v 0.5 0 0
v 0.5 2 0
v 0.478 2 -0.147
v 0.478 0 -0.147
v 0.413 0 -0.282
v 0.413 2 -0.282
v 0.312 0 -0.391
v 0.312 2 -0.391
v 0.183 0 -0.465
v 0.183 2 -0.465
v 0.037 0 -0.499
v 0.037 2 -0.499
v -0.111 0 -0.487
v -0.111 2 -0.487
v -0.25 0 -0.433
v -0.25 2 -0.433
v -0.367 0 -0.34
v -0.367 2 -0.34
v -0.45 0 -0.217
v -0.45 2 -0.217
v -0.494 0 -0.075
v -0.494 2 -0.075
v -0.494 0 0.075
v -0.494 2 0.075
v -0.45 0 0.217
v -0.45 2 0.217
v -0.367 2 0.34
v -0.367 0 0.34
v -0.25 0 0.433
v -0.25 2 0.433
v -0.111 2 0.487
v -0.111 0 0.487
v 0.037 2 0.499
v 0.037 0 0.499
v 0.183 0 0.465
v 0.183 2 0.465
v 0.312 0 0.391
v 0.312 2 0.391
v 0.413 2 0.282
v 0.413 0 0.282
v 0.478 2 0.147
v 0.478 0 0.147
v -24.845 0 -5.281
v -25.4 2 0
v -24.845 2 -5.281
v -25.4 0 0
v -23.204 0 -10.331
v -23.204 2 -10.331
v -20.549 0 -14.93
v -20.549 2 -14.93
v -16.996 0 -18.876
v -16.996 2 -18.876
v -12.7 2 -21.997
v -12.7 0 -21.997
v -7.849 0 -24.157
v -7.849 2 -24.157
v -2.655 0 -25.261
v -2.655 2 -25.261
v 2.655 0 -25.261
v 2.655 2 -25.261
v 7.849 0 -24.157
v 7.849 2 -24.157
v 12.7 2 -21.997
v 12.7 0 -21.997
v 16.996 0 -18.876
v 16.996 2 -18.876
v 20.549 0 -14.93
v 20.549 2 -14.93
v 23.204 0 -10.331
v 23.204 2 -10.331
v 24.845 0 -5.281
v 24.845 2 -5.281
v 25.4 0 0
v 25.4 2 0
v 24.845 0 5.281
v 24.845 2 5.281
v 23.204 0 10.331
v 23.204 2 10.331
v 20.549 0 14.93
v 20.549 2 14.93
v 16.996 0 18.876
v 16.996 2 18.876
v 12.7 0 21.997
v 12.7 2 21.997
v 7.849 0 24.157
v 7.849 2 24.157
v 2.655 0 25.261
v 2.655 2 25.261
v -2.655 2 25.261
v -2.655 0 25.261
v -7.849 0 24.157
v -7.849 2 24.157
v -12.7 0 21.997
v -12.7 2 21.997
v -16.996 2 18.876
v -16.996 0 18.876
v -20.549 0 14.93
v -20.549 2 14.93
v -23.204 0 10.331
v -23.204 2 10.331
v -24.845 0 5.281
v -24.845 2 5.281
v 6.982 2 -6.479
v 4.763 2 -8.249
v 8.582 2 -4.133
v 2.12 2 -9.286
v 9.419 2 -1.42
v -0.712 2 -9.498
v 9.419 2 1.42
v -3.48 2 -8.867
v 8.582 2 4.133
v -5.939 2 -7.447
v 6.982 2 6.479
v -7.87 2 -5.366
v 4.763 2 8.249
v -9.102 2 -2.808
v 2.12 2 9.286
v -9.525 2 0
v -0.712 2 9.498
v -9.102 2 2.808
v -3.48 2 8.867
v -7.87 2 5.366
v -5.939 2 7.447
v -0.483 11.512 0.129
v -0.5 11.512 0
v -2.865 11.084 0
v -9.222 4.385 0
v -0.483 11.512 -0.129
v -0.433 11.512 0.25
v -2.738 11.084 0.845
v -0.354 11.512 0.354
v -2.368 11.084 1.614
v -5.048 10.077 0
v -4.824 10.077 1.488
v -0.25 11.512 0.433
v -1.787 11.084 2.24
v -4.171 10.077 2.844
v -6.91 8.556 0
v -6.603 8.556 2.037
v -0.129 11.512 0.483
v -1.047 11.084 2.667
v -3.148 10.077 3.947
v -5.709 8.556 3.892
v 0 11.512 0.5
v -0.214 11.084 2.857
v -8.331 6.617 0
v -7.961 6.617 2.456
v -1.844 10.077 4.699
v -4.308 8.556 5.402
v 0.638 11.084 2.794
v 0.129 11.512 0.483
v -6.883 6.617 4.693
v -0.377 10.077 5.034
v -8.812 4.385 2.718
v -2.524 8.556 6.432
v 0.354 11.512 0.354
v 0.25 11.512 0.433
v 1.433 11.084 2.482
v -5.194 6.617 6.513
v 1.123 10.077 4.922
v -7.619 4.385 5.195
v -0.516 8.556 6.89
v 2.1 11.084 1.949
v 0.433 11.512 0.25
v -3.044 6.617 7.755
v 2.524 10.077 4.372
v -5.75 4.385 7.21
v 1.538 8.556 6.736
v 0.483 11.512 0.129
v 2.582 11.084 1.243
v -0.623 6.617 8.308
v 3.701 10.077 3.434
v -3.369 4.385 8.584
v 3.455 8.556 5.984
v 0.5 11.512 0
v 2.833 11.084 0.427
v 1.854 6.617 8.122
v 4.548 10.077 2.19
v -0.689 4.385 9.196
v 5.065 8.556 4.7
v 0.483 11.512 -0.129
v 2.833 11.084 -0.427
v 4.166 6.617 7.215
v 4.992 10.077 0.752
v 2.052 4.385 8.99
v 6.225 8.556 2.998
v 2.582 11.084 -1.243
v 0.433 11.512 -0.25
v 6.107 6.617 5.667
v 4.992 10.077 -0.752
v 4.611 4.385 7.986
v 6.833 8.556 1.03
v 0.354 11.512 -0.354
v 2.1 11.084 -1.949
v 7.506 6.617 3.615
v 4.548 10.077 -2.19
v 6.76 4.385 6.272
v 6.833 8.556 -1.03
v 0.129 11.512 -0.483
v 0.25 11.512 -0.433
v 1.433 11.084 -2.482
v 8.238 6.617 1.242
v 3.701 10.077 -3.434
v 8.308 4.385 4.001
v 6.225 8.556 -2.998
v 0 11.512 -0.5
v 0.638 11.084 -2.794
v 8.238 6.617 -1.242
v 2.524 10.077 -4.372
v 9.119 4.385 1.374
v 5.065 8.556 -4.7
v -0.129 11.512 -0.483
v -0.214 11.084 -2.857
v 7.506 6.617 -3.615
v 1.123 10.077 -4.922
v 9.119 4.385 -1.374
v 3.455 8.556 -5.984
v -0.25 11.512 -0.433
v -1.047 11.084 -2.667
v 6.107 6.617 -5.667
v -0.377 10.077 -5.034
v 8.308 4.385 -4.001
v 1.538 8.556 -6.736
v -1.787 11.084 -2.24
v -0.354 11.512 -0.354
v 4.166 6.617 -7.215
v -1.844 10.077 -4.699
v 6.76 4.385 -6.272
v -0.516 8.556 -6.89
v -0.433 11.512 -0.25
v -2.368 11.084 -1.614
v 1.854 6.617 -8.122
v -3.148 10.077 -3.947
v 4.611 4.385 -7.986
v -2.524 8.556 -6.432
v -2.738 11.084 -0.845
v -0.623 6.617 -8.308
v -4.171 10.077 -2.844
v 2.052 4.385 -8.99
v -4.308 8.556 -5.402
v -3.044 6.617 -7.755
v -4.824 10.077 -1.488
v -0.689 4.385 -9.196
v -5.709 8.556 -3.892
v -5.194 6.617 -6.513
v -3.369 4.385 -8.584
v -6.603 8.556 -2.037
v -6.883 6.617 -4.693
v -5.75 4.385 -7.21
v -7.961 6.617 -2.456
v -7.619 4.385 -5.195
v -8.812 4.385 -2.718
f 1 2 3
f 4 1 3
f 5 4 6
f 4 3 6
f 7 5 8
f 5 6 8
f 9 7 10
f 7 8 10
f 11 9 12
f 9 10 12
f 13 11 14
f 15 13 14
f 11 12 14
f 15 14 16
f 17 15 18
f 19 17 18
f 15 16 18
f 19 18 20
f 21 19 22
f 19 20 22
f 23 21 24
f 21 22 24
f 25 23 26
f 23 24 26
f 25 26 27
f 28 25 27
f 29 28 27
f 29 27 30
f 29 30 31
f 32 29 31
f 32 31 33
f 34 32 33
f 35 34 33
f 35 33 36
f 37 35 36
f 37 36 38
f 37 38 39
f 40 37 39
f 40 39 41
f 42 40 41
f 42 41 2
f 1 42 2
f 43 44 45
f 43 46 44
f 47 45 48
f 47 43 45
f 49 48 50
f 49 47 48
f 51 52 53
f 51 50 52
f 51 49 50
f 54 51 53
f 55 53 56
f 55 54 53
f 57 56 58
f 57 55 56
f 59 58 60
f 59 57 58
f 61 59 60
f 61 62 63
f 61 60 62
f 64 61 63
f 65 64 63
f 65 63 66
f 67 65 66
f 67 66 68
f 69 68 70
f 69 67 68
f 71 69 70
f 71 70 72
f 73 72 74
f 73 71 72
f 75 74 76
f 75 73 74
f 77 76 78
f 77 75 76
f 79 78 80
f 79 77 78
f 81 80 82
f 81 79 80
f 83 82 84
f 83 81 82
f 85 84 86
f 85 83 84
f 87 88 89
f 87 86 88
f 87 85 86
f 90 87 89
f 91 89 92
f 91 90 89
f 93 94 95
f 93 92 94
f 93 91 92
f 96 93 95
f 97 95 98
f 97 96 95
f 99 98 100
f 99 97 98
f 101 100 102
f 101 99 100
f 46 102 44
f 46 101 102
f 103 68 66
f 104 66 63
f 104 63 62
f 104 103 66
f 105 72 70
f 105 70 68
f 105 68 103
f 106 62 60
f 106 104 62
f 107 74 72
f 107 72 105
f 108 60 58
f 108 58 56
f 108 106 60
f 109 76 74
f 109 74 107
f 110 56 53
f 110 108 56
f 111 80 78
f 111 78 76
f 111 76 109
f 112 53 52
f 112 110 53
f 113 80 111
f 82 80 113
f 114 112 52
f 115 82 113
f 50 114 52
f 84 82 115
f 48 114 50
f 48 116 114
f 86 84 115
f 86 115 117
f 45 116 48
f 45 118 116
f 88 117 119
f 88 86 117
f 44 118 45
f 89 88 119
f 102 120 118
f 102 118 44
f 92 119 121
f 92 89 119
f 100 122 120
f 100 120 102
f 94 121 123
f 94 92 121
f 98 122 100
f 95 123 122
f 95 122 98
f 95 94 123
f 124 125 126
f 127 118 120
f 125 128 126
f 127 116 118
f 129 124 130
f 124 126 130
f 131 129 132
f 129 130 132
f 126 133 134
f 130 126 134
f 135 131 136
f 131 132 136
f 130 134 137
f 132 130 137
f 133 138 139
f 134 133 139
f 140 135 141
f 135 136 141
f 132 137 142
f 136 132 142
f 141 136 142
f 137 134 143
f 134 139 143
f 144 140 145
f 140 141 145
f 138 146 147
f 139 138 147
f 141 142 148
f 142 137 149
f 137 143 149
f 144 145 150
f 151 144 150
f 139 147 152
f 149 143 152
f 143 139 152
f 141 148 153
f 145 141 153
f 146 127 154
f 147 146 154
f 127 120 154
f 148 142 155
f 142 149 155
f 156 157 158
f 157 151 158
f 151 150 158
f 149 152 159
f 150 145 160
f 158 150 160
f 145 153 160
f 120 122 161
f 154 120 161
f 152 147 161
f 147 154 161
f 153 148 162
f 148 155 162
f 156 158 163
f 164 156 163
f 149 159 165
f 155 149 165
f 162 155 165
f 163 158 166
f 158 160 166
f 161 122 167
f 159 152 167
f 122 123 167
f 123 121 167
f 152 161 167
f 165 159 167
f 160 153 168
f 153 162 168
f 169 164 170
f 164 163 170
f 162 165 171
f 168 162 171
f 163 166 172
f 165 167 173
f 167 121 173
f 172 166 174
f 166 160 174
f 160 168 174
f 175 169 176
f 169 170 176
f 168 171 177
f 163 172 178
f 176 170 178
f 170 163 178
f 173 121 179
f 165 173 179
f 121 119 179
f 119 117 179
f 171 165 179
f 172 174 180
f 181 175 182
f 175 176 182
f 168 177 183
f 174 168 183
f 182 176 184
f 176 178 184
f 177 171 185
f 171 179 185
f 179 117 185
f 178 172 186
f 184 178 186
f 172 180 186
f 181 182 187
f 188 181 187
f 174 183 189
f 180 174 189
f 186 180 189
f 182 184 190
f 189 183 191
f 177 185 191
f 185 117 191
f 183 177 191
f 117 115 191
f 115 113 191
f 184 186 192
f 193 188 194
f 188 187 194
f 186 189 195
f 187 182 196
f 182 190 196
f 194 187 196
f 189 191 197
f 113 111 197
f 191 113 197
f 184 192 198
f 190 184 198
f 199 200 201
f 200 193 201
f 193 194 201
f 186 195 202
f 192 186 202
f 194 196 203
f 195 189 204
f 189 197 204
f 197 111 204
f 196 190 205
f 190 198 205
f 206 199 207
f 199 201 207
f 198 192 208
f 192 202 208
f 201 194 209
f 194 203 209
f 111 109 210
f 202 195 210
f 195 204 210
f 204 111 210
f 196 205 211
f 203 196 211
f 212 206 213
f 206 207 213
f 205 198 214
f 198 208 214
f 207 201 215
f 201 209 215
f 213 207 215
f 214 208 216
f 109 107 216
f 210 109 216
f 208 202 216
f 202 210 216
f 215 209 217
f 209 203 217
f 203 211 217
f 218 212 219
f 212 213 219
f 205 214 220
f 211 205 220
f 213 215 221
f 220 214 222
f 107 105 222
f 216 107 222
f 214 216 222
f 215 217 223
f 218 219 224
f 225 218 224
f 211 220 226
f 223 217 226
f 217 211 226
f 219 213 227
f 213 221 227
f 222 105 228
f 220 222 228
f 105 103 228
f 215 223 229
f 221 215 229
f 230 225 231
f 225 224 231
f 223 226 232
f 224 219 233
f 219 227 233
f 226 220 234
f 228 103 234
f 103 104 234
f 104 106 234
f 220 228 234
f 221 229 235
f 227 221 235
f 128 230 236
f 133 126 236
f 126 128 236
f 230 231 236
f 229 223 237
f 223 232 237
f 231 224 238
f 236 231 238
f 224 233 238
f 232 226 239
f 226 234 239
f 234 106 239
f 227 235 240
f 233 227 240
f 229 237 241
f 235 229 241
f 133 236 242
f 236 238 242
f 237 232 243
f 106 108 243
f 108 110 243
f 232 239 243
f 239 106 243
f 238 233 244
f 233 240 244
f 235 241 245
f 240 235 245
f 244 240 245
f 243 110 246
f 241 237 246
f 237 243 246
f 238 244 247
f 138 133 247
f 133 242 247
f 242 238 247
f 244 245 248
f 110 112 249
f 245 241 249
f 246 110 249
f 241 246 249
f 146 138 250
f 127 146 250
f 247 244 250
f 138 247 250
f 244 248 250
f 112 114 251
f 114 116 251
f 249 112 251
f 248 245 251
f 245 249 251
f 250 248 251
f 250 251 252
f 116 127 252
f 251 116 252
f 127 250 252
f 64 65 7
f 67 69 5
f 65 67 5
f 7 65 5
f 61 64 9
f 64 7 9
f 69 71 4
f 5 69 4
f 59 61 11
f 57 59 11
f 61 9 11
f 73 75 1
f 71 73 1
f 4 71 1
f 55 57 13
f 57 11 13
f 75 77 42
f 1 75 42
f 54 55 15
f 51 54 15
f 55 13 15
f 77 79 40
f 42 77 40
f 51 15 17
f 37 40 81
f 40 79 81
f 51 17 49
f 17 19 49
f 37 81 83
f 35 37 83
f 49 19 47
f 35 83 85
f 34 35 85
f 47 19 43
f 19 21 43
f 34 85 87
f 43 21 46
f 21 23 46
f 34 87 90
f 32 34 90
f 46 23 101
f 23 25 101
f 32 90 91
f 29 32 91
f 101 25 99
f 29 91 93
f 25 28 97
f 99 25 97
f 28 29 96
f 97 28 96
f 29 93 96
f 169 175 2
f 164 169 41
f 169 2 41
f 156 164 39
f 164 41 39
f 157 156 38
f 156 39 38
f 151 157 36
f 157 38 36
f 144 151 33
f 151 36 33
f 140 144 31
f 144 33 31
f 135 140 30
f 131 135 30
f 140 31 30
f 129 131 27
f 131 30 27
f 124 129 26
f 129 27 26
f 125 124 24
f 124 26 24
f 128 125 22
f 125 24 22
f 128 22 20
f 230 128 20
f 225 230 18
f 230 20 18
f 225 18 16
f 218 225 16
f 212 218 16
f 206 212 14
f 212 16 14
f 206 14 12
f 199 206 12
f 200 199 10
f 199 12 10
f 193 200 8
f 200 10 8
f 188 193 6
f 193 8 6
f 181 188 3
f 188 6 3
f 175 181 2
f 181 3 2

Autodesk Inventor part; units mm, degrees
ref_plane "YZ Plane" through (0, 0, 0) normal (1, 0, 0) x (0, 1, 0)
ref_plane "XZ Plane" through (0, 0, 0) normal (0, 1, 0) x (-1, 0, 0)
ref_plane "XY Plane" through (0, 0, 0) normal (0, 0, 1) x (1, 0, 0)
sketch "Sketch1" plane through (0, 0, 0) normal (0, 1, 0) x (-1, 0, 0)
  circle A0 centre (0, 0) radius 25.4
  dimension "d0" = 50.8
extrude "Extrusion1" add sketch "Sketch1" along normal blind 2
sketch "Sketch3" plane through (0, 0, 0) normal (0, 0, 1) x (1, 0, 0)
  line L0 (-25.4, 0) -> (25.4, 0) projected
  line L1 (25.4, 2) -> (-25.4, 2) projected
  line L2 (0, 2) -> (0, 13.4486)
  arc A0 (9.3127, 0) -> (9.525, 2) centre (0, 2) ccw
  arc A1 (0, 11.525) -> (-9.3127, 0) centre (0, 2) ccw
  line L3 (0, 2) -> (-9.525, 2)
  point P0 (0, 0)
revolve "Revolution1" add sketch "Sketch3" angle 360 about axis through (0, 2, 0) along (0, 1, 0) contours A1 L2 L1
sketch "Sketch2" plane through (0, 2, 0) normal (0, 1, 0) x (1, 0, 0)
  circle A0 centre (0, 0) radius 25.4 projected
  circle A1 centre (0, 0) radius 0.5
  dimension "d3" = 1
extrude "Extrusion2" cut sketch "Sketch2" along normal through all both and the other way through all contours A1
properties part number "flower"
